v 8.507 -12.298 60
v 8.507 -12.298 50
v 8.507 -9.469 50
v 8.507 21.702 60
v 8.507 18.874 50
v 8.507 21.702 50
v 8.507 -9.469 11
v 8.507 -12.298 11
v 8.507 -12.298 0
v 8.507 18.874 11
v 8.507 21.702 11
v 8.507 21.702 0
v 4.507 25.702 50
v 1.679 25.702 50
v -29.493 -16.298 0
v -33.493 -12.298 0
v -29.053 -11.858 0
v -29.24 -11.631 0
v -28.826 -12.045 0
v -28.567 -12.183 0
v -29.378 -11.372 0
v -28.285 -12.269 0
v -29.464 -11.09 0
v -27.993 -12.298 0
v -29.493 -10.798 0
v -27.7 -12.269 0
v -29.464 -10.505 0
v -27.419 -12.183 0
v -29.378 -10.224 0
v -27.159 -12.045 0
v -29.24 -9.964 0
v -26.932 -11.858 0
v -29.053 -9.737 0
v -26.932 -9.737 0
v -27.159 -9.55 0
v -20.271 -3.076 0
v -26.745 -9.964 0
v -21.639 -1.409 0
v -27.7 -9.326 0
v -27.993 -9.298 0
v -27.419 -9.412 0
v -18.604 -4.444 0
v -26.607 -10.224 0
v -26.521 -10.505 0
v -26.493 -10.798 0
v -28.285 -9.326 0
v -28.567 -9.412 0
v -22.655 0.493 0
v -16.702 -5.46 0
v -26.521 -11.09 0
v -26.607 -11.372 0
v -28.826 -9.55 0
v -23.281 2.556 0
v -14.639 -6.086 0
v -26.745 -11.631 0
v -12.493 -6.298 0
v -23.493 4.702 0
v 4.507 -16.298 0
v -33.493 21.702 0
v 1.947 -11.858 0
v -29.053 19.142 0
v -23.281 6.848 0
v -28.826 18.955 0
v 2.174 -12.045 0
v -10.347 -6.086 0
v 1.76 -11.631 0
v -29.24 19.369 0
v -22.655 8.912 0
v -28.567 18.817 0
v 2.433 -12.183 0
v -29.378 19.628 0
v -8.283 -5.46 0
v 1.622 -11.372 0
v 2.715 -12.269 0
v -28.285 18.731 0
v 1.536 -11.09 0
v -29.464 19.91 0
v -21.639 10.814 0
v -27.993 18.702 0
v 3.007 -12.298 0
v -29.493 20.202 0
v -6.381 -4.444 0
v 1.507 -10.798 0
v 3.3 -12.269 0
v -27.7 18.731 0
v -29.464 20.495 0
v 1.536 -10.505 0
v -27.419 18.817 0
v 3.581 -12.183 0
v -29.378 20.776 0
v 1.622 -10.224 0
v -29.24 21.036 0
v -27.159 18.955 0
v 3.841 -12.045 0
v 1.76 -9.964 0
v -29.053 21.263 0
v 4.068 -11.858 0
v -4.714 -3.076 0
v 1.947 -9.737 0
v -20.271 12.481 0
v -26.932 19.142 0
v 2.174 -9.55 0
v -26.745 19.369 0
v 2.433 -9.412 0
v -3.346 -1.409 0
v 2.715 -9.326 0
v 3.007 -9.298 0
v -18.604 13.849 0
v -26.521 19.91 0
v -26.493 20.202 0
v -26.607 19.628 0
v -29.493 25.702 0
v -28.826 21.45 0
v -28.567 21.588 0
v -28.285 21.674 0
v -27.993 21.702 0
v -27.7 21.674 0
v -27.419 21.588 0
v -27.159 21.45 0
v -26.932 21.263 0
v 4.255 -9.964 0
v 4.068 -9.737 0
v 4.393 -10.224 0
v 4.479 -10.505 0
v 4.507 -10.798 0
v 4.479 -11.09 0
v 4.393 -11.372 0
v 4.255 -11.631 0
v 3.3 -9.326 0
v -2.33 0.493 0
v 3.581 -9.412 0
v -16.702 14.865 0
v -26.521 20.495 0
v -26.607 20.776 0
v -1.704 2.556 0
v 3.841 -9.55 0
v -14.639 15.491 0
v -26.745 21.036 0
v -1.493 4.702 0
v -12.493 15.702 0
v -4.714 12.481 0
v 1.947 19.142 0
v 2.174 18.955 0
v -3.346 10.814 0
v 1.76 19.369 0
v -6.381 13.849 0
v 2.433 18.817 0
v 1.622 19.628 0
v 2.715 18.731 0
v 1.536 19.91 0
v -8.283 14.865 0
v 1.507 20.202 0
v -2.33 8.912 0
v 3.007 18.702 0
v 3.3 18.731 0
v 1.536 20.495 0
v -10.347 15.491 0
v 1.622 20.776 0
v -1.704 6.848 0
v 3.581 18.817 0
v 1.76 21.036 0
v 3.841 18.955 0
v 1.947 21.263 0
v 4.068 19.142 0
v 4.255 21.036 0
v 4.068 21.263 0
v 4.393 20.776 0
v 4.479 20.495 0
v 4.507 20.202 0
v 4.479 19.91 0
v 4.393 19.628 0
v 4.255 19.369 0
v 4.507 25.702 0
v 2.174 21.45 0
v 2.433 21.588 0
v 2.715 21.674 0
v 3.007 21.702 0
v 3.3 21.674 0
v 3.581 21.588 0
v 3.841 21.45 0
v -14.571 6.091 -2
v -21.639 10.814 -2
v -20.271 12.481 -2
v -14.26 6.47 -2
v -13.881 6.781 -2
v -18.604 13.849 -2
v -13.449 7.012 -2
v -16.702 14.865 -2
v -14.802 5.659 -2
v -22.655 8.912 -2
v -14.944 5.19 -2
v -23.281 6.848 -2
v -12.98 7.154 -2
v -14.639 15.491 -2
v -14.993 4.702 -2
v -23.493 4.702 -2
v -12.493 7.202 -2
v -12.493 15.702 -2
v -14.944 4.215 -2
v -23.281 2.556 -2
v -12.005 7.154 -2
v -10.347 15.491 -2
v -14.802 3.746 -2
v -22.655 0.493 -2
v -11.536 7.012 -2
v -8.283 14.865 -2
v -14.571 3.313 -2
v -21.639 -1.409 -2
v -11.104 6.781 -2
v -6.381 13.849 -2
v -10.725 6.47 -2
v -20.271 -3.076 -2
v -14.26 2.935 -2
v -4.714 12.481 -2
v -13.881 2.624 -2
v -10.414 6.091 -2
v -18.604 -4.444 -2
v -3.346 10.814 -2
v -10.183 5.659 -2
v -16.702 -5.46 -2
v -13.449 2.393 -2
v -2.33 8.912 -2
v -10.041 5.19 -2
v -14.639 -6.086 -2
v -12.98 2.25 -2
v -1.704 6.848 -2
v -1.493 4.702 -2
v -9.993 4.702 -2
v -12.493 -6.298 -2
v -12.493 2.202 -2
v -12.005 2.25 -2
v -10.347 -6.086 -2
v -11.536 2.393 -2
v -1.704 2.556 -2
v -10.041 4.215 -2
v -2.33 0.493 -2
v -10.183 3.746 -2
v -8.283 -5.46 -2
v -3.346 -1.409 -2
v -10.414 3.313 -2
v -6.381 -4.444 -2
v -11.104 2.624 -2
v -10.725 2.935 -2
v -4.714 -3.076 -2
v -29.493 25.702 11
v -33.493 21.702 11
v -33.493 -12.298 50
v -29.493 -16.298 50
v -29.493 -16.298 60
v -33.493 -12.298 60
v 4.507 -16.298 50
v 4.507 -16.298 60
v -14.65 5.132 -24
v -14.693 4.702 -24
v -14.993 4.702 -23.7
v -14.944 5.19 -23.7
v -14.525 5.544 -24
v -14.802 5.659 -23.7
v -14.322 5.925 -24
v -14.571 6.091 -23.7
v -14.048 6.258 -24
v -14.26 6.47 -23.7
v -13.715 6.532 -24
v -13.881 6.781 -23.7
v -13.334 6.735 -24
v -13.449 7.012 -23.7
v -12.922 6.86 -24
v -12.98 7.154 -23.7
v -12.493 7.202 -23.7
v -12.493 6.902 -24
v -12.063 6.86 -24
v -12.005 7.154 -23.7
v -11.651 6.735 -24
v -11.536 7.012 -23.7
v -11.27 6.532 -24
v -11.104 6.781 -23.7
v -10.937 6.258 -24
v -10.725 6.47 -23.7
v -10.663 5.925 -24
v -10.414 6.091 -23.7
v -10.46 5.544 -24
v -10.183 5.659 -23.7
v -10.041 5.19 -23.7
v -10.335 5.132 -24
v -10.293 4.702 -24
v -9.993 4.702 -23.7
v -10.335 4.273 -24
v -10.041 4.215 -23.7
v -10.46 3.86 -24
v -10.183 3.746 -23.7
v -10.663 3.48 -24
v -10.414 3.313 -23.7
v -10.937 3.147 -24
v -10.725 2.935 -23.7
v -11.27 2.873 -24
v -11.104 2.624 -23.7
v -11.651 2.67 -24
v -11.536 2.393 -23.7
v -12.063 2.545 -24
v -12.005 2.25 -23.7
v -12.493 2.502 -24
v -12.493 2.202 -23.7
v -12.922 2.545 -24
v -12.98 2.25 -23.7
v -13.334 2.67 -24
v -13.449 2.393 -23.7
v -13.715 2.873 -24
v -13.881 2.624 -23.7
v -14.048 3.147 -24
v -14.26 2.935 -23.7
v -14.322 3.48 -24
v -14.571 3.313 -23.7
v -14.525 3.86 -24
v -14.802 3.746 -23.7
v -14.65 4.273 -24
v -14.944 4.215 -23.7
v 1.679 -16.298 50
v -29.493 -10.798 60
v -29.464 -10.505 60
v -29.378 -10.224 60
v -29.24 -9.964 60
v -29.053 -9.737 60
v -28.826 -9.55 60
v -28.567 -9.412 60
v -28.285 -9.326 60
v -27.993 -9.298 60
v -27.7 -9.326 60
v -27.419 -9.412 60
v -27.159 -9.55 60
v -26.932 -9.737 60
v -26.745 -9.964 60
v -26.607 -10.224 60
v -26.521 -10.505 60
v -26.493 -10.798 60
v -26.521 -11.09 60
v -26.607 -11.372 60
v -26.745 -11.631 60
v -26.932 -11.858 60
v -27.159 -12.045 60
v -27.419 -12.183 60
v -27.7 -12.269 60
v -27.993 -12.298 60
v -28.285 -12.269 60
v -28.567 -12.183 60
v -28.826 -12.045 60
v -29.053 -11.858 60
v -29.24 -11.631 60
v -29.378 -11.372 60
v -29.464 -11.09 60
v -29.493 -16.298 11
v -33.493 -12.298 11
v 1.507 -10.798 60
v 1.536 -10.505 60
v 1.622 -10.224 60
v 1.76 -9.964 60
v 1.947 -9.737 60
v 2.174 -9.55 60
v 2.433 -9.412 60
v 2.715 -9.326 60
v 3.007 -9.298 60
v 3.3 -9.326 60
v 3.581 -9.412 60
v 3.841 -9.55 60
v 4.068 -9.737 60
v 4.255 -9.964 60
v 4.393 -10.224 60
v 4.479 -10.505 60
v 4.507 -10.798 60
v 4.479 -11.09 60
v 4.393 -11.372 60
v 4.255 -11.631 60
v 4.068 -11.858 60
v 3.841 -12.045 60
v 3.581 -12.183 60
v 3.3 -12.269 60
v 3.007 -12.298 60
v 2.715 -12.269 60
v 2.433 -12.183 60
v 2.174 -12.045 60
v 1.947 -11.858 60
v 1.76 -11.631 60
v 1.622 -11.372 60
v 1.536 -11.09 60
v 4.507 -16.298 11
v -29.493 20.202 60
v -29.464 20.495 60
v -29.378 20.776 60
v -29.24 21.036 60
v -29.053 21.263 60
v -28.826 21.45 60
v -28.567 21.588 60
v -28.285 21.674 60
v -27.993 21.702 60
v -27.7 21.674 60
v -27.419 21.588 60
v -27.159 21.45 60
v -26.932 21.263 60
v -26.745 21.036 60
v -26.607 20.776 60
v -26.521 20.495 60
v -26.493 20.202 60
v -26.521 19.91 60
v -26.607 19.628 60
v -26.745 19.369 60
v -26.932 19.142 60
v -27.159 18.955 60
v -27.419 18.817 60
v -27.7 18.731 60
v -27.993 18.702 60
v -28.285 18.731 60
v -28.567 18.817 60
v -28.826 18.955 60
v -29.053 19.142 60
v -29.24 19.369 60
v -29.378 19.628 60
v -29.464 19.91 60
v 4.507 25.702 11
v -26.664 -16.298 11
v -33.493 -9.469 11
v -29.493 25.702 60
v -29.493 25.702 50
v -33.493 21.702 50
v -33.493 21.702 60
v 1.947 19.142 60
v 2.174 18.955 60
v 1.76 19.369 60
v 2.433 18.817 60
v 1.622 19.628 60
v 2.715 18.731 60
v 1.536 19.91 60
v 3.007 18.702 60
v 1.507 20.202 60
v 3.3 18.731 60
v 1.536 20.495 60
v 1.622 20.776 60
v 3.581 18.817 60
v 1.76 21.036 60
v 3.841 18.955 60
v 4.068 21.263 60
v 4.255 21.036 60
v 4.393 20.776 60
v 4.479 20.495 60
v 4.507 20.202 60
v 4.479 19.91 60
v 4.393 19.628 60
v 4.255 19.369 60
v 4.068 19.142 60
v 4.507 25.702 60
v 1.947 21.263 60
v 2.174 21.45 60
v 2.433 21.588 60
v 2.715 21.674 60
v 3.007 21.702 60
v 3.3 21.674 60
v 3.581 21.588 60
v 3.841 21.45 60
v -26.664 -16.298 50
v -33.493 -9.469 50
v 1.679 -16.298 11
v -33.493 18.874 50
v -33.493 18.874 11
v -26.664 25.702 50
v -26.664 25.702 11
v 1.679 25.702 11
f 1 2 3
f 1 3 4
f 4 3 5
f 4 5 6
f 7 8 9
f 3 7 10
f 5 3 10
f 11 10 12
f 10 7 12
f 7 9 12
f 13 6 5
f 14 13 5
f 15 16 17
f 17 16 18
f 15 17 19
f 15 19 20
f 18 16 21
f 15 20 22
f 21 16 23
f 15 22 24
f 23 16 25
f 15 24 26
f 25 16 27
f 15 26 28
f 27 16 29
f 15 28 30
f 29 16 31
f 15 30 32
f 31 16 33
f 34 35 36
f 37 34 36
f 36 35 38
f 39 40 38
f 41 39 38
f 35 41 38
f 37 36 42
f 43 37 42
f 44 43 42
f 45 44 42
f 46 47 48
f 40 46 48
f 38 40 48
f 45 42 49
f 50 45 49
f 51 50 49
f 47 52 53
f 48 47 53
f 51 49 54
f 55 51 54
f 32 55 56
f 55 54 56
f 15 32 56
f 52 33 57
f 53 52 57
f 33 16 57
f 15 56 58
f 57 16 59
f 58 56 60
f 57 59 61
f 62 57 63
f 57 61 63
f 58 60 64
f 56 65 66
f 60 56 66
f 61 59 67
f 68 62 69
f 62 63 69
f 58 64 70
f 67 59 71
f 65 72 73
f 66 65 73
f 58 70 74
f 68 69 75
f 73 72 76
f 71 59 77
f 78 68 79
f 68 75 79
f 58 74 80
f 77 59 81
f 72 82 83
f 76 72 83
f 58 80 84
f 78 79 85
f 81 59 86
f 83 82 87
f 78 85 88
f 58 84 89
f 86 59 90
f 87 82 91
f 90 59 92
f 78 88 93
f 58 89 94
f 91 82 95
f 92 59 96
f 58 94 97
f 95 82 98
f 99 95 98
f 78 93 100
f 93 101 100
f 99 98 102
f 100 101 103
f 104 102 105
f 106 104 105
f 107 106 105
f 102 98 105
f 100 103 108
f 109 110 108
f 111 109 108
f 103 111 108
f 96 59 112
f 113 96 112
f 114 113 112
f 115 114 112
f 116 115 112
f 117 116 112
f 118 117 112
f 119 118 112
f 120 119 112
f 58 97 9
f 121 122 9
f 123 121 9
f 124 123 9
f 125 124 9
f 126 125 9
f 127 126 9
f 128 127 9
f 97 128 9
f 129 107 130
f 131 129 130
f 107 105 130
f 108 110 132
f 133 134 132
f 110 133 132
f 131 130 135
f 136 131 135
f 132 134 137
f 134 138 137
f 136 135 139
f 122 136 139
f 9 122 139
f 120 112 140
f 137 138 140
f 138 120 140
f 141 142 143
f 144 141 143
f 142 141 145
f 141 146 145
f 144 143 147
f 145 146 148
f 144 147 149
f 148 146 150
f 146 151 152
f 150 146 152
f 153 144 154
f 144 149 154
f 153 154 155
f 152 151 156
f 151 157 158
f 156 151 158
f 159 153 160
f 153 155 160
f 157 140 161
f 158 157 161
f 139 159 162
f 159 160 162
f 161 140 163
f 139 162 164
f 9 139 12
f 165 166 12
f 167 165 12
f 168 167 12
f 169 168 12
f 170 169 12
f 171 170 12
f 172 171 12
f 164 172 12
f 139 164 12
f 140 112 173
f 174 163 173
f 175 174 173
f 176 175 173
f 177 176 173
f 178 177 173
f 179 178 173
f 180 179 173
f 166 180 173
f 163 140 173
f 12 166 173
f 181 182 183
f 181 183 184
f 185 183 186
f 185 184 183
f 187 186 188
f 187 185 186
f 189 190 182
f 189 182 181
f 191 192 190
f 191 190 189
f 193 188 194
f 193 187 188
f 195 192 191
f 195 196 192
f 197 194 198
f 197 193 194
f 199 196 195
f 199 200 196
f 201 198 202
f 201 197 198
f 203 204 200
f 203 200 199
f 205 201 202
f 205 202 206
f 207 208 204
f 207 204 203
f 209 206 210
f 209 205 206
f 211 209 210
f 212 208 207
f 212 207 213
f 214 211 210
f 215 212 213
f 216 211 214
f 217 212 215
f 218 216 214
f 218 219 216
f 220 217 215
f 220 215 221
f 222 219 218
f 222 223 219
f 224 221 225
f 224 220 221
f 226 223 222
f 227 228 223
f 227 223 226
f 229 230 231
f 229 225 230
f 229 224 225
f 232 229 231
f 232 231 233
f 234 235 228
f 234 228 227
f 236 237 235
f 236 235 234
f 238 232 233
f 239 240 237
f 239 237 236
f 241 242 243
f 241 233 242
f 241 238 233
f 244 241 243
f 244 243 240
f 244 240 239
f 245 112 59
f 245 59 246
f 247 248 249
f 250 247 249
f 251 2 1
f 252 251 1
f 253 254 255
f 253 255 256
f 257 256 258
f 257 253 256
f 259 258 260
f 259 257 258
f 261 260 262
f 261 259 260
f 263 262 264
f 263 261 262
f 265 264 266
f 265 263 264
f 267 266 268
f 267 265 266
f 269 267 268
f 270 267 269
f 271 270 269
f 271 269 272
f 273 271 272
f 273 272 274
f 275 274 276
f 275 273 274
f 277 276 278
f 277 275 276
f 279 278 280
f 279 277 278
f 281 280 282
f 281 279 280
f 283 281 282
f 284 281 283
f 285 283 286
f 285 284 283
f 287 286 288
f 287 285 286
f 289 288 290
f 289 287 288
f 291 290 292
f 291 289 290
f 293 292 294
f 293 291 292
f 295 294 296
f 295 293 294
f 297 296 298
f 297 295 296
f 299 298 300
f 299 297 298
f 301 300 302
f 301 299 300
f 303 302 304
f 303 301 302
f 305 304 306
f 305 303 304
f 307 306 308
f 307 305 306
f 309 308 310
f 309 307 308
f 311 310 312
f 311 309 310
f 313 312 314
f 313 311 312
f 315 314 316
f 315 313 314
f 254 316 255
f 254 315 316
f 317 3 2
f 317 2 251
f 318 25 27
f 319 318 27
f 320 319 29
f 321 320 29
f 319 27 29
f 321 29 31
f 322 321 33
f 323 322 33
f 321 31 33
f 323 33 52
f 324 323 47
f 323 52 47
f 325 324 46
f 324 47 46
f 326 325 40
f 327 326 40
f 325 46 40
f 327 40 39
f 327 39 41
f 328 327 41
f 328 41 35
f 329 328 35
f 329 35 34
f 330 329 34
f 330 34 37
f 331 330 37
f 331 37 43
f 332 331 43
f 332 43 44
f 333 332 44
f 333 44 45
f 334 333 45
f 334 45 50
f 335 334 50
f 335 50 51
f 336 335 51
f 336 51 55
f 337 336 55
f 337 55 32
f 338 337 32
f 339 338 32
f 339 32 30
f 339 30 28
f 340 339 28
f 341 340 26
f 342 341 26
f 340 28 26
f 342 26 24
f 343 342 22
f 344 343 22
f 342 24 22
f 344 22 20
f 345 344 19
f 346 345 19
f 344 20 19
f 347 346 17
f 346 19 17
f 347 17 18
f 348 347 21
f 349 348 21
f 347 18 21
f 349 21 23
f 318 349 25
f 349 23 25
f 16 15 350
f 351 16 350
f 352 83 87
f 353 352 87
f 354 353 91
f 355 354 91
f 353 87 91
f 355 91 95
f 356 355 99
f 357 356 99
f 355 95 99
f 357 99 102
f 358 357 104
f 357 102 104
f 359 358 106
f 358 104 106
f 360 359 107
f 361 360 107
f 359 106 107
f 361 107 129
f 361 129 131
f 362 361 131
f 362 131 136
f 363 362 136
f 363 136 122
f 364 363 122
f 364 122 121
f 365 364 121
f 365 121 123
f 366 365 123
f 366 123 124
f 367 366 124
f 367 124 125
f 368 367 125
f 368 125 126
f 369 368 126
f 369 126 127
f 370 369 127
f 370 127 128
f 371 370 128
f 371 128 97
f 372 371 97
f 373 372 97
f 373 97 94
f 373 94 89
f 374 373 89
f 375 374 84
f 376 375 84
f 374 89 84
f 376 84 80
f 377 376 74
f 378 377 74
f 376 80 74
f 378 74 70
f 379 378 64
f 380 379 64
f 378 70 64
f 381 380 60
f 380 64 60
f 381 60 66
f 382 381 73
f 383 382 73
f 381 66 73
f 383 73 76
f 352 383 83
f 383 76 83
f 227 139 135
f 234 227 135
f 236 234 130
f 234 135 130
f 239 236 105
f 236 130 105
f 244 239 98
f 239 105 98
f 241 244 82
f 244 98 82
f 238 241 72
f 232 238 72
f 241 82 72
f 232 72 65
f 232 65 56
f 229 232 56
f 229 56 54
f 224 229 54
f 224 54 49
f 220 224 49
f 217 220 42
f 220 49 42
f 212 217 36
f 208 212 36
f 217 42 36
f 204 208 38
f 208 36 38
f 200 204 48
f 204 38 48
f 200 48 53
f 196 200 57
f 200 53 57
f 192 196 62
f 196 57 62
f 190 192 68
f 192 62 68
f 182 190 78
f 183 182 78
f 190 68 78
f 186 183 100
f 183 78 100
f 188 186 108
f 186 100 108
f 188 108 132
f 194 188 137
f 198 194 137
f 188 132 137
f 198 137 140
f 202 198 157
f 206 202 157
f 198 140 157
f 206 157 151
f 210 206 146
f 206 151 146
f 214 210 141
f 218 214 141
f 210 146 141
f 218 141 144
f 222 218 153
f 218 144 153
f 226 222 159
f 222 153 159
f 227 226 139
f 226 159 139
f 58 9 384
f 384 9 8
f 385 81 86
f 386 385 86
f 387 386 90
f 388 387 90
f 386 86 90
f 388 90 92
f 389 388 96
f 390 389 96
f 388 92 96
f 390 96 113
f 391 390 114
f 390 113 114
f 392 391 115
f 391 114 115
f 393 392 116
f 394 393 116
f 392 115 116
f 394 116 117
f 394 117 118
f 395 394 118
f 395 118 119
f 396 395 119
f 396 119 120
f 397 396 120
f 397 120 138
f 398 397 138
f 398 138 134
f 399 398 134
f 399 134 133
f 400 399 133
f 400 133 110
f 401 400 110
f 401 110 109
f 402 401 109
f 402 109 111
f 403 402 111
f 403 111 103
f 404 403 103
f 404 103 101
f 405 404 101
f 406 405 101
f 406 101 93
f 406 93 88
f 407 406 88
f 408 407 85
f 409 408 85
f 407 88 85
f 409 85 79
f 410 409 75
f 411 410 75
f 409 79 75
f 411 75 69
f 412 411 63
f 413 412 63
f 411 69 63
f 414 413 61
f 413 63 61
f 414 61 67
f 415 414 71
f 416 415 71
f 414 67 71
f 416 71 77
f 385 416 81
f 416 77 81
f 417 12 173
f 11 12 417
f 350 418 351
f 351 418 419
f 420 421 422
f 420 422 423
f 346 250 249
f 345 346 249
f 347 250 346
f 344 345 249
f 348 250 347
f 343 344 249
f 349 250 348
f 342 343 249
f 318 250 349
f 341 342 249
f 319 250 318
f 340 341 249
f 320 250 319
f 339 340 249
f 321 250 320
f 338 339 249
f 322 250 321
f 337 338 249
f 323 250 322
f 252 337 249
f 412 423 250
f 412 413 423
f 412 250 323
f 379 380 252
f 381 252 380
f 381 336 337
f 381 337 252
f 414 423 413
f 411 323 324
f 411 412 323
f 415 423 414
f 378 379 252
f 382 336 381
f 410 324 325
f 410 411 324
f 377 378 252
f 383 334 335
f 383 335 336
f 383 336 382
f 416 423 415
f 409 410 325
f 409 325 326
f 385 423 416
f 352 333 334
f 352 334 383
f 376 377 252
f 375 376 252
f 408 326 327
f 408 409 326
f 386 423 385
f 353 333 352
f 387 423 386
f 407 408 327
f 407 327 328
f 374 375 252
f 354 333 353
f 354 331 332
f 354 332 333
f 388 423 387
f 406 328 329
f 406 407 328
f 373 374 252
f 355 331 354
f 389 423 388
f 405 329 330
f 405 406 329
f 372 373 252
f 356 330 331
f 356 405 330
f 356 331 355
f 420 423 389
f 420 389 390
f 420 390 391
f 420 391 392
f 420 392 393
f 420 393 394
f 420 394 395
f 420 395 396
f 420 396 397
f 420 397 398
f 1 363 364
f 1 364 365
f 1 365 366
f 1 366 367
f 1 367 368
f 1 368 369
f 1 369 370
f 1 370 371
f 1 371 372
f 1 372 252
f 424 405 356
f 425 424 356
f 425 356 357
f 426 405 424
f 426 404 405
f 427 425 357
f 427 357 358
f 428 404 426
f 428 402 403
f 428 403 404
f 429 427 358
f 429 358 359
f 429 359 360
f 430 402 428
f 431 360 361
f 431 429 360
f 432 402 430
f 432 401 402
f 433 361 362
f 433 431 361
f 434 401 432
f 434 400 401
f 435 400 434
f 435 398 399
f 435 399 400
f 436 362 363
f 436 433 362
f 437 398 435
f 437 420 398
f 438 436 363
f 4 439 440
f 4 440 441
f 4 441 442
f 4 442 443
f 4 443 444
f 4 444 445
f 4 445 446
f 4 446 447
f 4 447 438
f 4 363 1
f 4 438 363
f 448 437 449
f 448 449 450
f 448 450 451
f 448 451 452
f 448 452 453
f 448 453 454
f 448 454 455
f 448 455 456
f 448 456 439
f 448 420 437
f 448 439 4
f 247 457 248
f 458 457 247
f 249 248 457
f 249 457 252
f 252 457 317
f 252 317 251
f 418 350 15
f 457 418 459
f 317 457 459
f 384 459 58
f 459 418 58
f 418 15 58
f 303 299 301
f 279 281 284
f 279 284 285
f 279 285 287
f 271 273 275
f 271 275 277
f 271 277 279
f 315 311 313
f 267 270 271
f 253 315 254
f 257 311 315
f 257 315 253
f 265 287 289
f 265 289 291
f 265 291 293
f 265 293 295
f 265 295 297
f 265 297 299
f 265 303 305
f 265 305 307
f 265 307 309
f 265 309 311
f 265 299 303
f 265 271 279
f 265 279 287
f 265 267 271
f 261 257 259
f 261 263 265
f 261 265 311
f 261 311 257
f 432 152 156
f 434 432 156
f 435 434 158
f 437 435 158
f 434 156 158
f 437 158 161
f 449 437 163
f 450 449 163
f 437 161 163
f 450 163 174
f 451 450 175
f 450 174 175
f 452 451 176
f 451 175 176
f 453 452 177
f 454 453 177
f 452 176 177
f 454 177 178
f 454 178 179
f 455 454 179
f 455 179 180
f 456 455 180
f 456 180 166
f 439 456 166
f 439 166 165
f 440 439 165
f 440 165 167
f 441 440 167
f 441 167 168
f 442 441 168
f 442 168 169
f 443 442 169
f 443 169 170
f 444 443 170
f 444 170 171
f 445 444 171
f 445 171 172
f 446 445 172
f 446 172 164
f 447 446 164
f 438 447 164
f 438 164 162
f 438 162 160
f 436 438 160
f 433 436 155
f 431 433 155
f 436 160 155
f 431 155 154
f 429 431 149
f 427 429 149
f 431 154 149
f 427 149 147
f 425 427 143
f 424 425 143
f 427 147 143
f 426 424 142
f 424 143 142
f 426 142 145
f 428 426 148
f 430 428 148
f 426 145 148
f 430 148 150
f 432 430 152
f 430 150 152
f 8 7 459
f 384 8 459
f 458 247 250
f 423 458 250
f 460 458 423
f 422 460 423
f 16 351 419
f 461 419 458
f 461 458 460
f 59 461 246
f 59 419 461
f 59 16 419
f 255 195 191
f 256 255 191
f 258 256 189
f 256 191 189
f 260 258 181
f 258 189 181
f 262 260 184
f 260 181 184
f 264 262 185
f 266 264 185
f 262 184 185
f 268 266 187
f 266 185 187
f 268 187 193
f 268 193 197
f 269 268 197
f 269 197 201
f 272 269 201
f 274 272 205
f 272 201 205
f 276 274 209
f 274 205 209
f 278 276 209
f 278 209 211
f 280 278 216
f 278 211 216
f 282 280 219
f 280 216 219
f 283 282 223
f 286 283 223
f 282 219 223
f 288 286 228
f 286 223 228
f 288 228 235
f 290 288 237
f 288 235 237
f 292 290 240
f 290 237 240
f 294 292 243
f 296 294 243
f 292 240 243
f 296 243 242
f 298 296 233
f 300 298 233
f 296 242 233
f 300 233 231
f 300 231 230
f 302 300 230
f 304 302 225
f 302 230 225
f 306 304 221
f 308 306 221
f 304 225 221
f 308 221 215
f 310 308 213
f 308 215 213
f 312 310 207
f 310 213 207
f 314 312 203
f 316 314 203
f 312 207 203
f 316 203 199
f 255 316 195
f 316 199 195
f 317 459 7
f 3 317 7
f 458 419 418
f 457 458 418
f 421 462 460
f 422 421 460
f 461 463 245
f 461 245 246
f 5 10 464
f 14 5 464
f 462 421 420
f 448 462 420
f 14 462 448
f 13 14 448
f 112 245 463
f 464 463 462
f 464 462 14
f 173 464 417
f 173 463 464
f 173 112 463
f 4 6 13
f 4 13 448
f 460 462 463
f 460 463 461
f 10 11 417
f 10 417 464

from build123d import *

# Parameters (mm, degrees)
SKETCH_1_W          = 42
SKETCH_1_H          = 42
EXTRUDE_1_DEPTH     = 60
SKETCH_2_R          = 1.5
CUT_EXTRUDE_1_DEPTH = 65
SKETCH_3_R          = 11
EXTRUDE_2_DEPTH     = 2
SKETCH_4_R          = 2.5
EXTRUDE_3_DEPTH     = 22
CHAMFER_1_SIZE      = 0.3
CHAMFER_2_SIZE      = 4
CUT_EXTRUDE_2_DEPTH = 39


with BuildPart() as part:
    # Эскиз1 → Бобышка-Вытянуть1 (new body)
    with BuildSketch(Plane.XY):
        with Locations((-12.492530381, 4.702380952)):
            Rectangle(SKETCH_1_W, SKETCH_1_H)
    extrude(amount=EXTRUDE_1_DEPTH)

    # Эскиз2 → Вырез-Вытянуть1 (cut)
    with BuildSketch(Plane(origin=(0, 0, 0), x_dir=(-1, 0, 0), z_dir=(0, 0, -1))):
        with Locations((-3.007469619, 20.202380952)):
            Circle(SKETCH_2_R)
        with Locations((27.992530381, 20.202380952)):
            Circle(SKETCH_2_R)
        with Locations((27.992530381, -10.797619048)):
            Circle(SKETCH_2_R)
        with Locations((-3.007469619, -10.797619048)):
            Circle(SKETCH_2_R)
    extrude(amount=-CUT_EXTRUDE_1_DEPTH, mode=Mode.SUBTRACT)

    # Эскиз3 → Бобышка-Вытянуть2 (add)
    with BuildSketch(Plane(origin=(0, 0, 0), x_dir=(-1, 0, 0), z_dir=(0, 0, -1))):
        with Locations(Location((12.492530381, 4.702380952, 0), (0, 0, 180))):
            Circle(SKETCH_3_R)
    extrude(amount=EXTRUDE_2_DEPTH)

    # Эскиз4 → Бобышка-Вытянуть3 (add)
    with BuildSketch(Plane(origin=(0, 0, -2), x_dir=(-1, 0, 0), z_dir=(0, 0, -1))):
        with Locations((12.492530381, 4.702380952)):
            Circle(SKETCH_4_R)
    extrude(amount=EXTRUDE_3_DEPTH)

    # Фаска1
    chamfer_1_edges = [part.edges().sort_by_distance(p)[0] for p in [
        (-9.992530381, 4.702380952, -24),
    ]]
    chamfer(chamfer_1_edges, length=CHAMFER_1_SIZE)

    # Фаска2
    chamfer_2_edges = [part.edges().sort_by_distance(p)[0] for p in [
        (-33.492530381, 25.702380952, 30),
        (8.507469619, 25.702380952, 30),
        (8.507469619, -16.297619048, 30),
        (-33.492530381, -16.297619048, 30),
    ]]
    chamfer(chamfer_2_edges, length=CHAMFER_2_SIZE)

    # Эскиз5 → Вырез-Вытянуть2 (cut)
    with BuildSketch(Plane(origin=(0, 0, 11), x_dir=(-1, 0, 0), z_dir=(0, 0, -1))):
        Polygon((-8.507469619, 18.873953828), (-1.679042494, 25.702380952), (-4.507469619, 25.702380952), (-8.507469619, 21.702380952), align=None)
        Polygon((-8.507469619, -9.469191923), (-8.507469619, -12.297619048), (-4.507469619, -16.297619048), (-1.679042494, -16.297619048), align=None)
        Polygon((26.664103256, 25.702380952), (33.492530381, 18.873953828), (33.492530381, 21.702380952), (29.492530381, 25.702380952), align=None)
        Polygon((33.492530381, -9.469191923), (26.664103256, -16.297619048), (29.492530381, -16.297619048), (33.492530381, -12.297619048), align=None)
    extrude(amount=-CUT_EXTRUDE_2_DEPTH, mode=Mode.SUBTRACT)


solid = part.part
